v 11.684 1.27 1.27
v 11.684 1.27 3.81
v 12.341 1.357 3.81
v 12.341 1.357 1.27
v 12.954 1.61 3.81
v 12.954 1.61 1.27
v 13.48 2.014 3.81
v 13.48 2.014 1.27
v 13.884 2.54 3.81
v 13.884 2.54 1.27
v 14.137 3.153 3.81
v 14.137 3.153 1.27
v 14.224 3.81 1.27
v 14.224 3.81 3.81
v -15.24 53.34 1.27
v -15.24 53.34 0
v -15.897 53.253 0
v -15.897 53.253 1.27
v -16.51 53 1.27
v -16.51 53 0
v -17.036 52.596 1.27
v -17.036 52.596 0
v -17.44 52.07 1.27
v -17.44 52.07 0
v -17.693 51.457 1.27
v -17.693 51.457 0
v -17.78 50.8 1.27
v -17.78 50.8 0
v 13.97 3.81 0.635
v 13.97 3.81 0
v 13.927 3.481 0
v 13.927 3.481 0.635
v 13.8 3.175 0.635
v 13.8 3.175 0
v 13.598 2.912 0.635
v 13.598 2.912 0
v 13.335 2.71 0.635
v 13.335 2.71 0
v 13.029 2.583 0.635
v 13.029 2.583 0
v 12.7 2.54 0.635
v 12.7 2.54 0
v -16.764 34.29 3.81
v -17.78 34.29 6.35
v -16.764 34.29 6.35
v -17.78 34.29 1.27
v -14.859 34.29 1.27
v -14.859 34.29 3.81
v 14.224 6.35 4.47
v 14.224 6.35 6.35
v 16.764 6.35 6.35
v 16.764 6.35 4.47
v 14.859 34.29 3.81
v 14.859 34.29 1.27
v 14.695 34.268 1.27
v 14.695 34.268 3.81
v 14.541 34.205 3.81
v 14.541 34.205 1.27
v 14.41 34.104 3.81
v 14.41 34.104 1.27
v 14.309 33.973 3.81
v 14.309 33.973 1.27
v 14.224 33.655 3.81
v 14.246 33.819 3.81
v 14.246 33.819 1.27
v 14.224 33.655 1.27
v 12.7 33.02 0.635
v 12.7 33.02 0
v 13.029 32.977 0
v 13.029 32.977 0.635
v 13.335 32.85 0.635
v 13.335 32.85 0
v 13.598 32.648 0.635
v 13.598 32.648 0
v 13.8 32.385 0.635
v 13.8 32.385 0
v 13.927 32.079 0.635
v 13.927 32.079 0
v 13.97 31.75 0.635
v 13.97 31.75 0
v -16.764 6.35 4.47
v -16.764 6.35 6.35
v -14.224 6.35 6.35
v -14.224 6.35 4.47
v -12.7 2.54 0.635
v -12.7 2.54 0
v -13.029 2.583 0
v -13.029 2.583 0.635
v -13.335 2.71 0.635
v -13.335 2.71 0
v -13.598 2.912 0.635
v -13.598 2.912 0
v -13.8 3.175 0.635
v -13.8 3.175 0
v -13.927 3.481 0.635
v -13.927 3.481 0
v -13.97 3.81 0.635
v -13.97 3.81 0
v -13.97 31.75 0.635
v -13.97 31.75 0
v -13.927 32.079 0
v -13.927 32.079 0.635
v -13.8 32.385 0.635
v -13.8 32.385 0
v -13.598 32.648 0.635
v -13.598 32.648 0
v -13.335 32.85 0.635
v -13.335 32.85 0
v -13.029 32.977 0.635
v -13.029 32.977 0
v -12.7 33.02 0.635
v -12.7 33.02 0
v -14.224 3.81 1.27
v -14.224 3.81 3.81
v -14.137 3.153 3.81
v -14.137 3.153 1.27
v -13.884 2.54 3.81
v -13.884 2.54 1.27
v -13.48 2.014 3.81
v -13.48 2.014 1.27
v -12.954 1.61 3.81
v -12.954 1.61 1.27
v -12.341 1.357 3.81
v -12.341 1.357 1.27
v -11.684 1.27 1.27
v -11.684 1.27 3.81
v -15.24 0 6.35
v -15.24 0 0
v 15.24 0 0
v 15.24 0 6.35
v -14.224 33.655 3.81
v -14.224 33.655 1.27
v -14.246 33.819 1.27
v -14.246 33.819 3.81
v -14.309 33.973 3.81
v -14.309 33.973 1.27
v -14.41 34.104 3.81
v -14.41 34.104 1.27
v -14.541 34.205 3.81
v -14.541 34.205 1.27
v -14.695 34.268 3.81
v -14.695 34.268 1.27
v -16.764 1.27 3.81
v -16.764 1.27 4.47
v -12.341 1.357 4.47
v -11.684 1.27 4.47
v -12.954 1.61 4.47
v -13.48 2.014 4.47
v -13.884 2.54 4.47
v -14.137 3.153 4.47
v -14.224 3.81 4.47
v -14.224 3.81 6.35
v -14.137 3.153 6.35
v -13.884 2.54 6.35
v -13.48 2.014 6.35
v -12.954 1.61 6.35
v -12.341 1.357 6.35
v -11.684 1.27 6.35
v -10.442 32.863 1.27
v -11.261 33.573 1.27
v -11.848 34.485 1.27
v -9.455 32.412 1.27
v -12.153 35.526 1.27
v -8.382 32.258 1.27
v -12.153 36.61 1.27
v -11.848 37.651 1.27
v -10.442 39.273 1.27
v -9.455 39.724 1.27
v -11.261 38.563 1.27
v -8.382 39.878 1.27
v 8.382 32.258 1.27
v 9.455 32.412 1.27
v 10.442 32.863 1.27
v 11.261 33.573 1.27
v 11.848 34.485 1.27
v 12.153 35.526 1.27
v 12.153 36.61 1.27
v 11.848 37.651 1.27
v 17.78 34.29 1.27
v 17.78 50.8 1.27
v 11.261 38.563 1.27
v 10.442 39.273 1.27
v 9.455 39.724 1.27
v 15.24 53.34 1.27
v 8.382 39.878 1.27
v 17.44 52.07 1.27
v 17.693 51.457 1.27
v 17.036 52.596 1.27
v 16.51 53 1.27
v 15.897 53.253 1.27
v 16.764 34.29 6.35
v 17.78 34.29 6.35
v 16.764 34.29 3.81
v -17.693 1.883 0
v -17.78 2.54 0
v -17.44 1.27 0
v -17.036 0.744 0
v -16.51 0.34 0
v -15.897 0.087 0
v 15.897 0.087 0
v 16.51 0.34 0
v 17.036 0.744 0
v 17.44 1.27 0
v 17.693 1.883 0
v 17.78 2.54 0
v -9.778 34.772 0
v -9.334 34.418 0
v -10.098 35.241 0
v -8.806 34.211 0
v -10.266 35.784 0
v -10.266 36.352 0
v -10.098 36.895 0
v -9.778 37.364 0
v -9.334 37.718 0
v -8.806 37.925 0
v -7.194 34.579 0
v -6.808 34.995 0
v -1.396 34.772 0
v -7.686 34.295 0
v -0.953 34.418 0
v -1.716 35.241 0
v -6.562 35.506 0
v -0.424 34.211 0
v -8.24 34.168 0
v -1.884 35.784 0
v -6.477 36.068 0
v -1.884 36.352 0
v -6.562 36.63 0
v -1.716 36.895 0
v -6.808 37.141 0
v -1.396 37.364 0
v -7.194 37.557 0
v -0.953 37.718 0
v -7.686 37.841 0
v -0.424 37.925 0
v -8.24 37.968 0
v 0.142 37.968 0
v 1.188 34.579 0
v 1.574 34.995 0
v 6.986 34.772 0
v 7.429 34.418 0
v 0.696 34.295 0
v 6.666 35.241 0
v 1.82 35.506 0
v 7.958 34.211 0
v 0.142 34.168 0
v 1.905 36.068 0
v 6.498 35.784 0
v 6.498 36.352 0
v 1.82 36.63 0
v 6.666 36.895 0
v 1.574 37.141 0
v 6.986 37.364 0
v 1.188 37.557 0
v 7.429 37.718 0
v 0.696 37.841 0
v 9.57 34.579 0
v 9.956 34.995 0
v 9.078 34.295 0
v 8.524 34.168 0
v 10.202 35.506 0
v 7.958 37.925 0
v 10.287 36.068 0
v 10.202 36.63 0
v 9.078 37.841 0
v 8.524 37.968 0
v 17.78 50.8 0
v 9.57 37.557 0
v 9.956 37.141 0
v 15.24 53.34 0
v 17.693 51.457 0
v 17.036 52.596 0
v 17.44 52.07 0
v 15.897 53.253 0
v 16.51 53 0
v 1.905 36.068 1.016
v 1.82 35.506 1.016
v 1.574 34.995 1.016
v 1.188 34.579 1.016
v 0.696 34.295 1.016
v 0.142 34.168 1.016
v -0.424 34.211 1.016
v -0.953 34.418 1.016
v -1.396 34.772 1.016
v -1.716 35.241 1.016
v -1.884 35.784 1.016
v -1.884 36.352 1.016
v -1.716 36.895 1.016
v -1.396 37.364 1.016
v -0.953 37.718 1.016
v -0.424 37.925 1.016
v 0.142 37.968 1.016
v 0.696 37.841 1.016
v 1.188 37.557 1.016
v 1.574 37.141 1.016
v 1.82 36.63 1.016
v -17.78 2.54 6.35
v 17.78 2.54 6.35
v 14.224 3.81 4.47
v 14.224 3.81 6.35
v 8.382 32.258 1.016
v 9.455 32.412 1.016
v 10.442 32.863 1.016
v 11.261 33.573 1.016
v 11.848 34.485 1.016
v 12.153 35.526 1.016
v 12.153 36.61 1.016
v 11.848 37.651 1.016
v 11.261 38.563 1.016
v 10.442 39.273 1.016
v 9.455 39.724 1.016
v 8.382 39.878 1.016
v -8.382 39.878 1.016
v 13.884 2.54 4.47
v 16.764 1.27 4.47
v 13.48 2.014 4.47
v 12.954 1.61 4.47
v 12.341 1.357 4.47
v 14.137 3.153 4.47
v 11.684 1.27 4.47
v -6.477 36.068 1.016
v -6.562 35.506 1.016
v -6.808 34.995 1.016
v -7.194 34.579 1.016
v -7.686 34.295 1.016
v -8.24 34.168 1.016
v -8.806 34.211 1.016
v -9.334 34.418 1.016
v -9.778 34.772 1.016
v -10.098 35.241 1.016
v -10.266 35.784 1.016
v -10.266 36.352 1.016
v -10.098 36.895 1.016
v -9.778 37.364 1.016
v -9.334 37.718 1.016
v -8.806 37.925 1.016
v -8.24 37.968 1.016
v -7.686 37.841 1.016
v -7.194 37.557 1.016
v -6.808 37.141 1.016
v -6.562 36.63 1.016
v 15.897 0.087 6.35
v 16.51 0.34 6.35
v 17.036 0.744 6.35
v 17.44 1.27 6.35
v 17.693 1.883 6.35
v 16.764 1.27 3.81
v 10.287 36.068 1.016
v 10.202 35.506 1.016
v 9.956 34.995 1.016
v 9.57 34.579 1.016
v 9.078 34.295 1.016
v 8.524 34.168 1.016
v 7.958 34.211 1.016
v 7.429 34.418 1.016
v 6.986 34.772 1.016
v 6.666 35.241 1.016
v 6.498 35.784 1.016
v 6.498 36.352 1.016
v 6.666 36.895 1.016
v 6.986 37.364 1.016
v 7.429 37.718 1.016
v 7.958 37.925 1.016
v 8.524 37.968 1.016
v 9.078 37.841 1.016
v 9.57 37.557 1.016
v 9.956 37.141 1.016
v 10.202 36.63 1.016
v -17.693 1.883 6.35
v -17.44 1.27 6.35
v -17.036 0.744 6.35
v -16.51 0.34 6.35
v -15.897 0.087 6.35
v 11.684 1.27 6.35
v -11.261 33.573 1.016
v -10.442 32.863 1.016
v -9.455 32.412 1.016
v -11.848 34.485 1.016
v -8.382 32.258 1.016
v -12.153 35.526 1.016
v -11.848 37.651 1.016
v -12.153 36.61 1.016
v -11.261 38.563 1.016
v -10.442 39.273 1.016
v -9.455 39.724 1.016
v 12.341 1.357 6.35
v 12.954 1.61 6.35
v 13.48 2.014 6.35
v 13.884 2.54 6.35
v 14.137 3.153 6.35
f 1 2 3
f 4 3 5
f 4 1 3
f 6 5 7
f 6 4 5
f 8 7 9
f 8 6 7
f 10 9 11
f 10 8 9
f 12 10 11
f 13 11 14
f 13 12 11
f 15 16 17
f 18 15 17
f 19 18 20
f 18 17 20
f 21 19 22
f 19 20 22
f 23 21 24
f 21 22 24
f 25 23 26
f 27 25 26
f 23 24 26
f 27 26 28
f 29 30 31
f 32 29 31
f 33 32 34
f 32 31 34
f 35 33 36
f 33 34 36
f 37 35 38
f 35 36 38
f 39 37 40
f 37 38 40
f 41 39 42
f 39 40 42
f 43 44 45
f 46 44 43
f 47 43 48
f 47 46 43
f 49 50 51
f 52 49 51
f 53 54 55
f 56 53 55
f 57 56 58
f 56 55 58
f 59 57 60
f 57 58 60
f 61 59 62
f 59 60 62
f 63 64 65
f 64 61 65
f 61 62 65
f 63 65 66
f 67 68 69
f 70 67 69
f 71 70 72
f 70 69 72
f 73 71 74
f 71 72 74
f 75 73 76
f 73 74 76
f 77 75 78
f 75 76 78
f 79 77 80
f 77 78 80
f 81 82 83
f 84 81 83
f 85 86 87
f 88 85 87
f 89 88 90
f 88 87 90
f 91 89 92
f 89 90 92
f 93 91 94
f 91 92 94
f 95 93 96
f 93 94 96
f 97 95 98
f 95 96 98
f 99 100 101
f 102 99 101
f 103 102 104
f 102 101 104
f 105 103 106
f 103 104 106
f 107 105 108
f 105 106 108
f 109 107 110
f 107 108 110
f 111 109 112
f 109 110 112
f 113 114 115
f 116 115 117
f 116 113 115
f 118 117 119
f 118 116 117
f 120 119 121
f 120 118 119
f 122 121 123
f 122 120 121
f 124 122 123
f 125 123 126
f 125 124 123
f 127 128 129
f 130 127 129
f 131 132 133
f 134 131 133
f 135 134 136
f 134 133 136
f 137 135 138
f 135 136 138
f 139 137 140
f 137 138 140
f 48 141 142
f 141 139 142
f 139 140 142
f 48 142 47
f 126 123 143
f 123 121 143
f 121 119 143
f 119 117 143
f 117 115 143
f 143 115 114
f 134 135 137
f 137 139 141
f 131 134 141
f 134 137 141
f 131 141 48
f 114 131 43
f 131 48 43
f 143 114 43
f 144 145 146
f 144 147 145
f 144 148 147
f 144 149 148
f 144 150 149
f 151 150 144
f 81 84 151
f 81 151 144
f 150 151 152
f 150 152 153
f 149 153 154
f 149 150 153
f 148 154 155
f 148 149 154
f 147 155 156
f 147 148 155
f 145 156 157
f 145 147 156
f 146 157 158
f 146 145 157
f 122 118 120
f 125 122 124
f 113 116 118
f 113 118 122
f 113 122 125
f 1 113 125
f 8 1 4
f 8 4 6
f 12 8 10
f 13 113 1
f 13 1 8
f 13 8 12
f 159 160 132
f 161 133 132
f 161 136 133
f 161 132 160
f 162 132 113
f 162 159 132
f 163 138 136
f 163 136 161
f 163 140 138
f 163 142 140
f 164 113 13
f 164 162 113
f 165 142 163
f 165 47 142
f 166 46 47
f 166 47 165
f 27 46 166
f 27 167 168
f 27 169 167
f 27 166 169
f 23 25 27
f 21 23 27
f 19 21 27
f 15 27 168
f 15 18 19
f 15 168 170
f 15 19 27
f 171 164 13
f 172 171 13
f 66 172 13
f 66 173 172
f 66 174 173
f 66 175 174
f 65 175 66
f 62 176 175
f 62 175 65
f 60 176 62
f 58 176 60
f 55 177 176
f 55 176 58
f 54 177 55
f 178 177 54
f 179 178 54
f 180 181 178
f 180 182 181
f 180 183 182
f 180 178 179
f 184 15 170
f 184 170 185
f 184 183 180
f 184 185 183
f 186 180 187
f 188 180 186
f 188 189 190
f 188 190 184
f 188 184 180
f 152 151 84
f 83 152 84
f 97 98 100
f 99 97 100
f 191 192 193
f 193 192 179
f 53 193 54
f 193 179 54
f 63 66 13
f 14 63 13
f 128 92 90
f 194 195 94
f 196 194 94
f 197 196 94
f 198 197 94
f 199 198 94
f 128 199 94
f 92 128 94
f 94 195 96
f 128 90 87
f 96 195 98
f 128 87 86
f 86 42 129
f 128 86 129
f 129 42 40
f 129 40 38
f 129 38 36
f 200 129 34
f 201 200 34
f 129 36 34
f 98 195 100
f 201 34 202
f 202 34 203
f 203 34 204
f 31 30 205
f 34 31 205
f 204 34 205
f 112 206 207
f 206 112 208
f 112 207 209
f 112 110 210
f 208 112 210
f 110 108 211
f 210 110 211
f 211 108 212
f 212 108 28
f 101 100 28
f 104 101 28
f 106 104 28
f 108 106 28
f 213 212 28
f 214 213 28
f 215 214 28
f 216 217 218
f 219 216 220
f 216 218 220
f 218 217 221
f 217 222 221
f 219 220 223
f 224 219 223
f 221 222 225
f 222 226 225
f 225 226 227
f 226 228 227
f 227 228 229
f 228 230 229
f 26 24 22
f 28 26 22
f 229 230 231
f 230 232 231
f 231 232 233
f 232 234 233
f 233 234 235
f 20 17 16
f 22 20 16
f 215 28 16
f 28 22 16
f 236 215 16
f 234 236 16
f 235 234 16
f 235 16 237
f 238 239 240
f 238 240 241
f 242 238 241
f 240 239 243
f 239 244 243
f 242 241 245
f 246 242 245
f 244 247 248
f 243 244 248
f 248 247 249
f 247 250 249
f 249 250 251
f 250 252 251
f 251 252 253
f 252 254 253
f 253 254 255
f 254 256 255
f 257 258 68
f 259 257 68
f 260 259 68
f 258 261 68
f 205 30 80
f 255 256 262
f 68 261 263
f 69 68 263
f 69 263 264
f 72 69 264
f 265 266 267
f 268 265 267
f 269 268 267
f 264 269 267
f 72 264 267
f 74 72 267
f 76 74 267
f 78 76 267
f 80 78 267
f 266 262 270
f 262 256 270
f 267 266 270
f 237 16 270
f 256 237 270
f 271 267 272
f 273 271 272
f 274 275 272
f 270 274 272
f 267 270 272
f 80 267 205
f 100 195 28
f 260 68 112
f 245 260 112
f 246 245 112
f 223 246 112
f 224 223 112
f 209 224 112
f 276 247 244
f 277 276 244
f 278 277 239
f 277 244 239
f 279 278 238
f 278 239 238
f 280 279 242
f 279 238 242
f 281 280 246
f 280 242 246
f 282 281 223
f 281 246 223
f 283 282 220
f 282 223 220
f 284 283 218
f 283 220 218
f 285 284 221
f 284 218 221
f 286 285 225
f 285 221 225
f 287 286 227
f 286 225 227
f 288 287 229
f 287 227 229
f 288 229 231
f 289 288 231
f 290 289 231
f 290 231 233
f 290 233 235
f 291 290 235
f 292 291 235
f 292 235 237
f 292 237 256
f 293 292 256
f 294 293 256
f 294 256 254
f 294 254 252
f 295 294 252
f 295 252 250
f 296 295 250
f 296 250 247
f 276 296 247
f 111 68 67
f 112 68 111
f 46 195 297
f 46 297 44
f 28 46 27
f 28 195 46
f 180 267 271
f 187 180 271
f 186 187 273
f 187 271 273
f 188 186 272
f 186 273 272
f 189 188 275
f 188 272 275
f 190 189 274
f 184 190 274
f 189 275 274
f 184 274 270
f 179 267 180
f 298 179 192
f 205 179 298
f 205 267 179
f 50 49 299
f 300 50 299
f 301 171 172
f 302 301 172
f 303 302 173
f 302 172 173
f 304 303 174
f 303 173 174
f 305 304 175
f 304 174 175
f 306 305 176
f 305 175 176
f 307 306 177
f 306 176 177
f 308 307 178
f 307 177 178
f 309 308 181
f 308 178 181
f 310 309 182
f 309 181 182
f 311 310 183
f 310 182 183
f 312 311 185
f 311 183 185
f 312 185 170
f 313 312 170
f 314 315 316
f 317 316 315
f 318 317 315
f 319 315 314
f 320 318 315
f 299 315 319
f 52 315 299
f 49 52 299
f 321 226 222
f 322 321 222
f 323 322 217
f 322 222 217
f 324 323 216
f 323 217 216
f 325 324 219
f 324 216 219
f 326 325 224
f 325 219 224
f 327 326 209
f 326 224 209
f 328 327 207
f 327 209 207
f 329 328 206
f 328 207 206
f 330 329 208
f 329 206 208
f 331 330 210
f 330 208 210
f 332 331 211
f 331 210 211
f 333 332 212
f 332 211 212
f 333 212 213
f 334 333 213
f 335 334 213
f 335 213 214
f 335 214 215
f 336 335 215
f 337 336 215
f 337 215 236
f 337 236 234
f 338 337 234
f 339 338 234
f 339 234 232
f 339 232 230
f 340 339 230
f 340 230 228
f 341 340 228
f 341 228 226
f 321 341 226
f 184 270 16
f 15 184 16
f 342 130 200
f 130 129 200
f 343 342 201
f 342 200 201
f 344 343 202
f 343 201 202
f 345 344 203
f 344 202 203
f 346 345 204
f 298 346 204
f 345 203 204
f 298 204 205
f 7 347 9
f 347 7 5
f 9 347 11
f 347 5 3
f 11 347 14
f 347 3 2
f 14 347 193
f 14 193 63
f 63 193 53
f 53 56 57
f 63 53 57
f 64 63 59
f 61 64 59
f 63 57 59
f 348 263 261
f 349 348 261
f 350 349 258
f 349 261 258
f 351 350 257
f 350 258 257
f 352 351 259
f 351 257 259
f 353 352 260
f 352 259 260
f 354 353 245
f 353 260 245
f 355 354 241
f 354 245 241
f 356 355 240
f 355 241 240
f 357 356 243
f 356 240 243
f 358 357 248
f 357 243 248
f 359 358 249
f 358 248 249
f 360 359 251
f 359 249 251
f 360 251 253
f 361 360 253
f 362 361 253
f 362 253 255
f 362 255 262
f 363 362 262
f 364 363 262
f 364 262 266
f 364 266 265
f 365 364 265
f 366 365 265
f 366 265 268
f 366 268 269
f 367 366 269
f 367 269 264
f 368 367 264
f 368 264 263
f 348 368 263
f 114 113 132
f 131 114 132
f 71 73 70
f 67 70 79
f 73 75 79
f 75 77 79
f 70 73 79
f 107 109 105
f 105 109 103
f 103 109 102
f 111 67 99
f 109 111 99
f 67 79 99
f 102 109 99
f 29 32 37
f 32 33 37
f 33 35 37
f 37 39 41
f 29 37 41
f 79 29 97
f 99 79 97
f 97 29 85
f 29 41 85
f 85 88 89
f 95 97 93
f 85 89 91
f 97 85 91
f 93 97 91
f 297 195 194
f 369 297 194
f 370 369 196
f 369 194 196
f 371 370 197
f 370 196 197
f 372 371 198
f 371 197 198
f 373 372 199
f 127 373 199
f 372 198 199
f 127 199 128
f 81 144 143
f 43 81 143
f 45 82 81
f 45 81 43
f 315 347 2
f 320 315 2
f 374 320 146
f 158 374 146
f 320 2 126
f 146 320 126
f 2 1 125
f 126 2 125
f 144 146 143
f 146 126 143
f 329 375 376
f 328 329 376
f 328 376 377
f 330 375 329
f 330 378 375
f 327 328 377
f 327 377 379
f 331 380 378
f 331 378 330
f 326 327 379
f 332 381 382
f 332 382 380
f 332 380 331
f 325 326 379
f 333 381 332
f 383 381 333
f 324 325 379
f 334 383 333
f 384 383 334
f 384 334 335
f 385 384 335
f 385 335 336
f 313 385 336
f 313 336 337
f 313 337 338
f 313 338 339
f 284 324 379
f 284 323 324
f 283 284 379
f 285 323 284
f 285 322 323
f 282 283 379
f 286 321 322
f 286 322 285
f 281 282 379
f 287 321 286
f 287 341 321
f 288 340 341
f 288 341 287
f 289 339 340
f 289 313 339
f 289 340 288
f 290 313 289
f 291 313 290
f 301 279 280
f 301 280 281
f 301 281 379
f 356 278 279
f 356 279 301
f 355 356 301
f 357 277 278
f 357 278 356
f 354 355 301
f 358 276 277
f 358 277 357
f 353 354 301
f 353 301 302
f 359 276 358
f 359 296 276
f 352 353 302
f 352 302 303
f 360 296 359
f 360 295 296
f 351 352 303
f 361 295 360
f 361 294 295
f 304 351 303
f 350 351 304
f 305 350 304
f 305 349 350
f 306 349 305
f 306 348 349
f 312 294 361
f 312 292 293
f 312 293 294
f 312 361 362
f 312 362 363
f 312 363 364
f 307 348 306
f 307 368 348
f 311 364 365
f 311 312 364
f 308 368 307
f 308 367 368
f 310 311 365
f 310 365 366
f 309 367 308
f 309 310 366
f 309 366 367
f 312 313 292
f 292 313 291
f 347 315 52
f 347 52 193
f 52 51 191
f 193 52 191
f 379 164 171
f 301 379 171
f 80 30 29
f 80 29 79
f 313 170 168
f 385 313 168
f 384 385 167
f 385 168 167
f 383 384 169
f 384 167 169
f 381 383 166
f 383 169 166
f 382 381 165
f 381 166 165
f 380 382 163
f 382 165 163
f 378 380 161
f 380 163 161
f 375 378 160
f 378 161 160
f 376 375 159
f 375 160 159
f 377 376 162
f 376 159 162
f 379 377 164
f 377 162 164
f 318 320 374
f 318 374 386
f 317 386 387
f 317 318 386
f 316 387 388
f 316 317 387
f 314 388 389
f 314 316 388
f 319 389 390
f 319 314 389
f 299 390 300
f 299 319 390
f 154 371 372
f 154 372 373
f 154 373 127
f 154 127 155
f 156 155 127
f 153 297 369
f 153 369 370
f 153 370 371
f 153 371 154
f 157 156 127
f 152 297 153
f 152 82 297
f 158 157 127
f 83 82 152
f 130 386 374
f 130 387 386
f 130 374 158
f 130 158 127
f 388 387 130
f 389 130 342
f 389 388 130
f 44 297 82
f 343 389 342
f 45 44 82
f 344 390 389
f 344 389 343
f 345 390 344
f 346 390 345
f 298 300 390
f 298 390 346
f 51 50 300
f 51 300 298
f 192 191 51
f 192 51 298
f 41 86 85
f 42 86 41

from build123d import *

# Parameters (mm, degrees)
PAD_DEPTH       = 1.27
POCKET_DEPTH    = 0.635
SKETCH002_R     = 1.905
POCKET001_DEPTH = 5.08
PAD001_DEPTH    = 5.08
SKETCH005_W     = 33.528
SKETCH005_H     = 0.6604
POCKET002_DEPTH = 33.02
SKETCH006_W     = 33.528
SKETCH006_H     = 27.94
POCKET003_DEPTH = 2.54
POCKET004_DEPTH = 0.254


with BuildPart() as part:
    # Sketch → Pad (new body)
    with BuildSketch(Plane.XY):
        with BuildLine():
            Line((-15.24, 0), (15.24, 0))
            ThreePointArc((15.24, 0), (17.036051, 0.743949), (17.78, 2.54))
            Line((17.78, 2.54), (17.78, 50.8))
            ThreePointArc((17.78, 50.8), (17.036051, 52.596051), (15.24, 53.34))
            Line((15.24, 53.34), (-15.24, 53.34))
            ThreePointArc((-15.24, 53.34), (-17.036051, 52.596051), (-17.78, 50.8))
            Line((-17.78, 2.54), (-17.78, 50.8))
            ThreePointArc((-17.78, 2.54), (-17.036051, 0.743949), (-15.24, 0))
        make_face()
    extrude(amount=PAD_DEPTH)

    # Sketch001 (on Face9 of Pad) → Pocket (cut)
    with BuildSketch(Plane(origin=(0, 0, 0), x_dir=(1, 0, 0), z_dir=(0, 0, -1))):
        with BuildLine():
            Line((-12.7, -2.54), (12.7, -2.54))
            ThreePointArc((13.97, -3.81), (13.598026, -2.911974), (12.7, -2.54))
            Line((13.97, -3.81), (13.97, -31.75))
            ThreePointArc((12.7, -33.02), (13.598026, -32.648026), (13.97, -31.75))
            Line((12.7, -33.02), (-12.7, -33.02))
            ThreePointArc((-13.97, -31.75), (-13.598026, -32.648026), (-12.7, -33.02))
            Line((-13.97, -3.81), (-13.97, -31.75))
            ThreePointArc((-12.7, -2.54), (-13.598026, -2.911974), (-13.97, -3.81))
        make_face()
    extrude(amount=-POCKET_DEPTH, mode=Mode.SUBTRACT)

    # Sketch002 (on Face4 of Pocket) → Pocket001 (cut)
    with BuildSketch(Plane(origin=(0, 0, 0), x_dir=(1, 0, 0), z_dir=(0, 0, -1))):
        with Locations((0, -36.068)):
            Circle(SKETCH002_R)
        with Locations((8.382, -36.068)):
            Circle(SKETCH002_R)
        with Locations((-8.382, -36.068)):
            Circle(SKETCH002_R)
    extrude(amount=-POCKET001_DEPTH, mode=Mode.SUBTRACT)

    # Sketch004 (on Face5 of Pocket001) → Pad001 (join)
    with BuildSketch(Plane.XY.offset(1.27)):
        with BuildLine():
            Line((-15.24, 0), (15.24, 0))
            ThreePointArc((15.24, 0), (17.036051, 0.743949), (17.78, 2.54))
            Line((17.78, 34.29), (17.78, 2.54))
            Line((17.78, 34.29), (14.859, 34.29))
            ThreePointArc((14.859, 34.29), (14.409987, 34.104013), (14.224, 33.655))
            Line((14.224, 33.655), (14.224, 3.81))
            ThreePointArc((11.684, 1.27), (13.480051, 2.013949), (14.224, 3.81))
            Line((11.684, 1.27), (-11.684, 1.27))
            ThreePointArc((-14.224, 3.81), (-13.480051, 2.013949), (-11.684, 1.27))
            Line((-14.224, 3.81), (-14.224, 33.655))
            ThreePointArc((-14.224, 33.655), (-14.409987, 34.104013), (-14.859, 34.29))
            Line((-17.78, 34.29), (-14.859, 34.29))
            Line((-17.78, 2.54), (-17.78, 34.29))
            ThreePointArc((-17.78, 2.54), (-17.036051, 0.743949), (-15.24, 0))
        make_face()
    extrude(amount=PAD001_DEPTH)

    # Sketch005 (on Face27 of Pad001) → Pocket002 (cut)
    with BuildSketch(Plane(origin=(0, 34.29, 0), x_dir=(-1, 0, 0), z_dir=(0, 1, 0))):
        with Locations((0, 4.1402)):
            Rectangle(SKETCH005_W, SKETCH005_H)
    extrude(amount=-POCKET002_DEPTH, mode=Mode.SUBTRACT)

    # Sketch006 (on Face25 of Pocket002) → Pocket003 (cut)
    with BuildSketch(Plane.XY.offset(6.35)):
        with Locations((0, 20.32)):
            Rectangle(SKETCH006_W, SKETCH006_H)
    extrude(amount=-POCKET003_DEPTH, mode=Mode.SUBTRACT)

    # Sketch007 (on Face8 of Pocket003) → Pocket004 (cut)
    with BuildSketch(Plane.XY.offset(1.27)):
        with BuildLine():
            ThreePointArc((-8.382, 39.878), (-12.192, 36.068), (-8.382, 32.258))
            Line((-8.382, 32.258), (8.382, 32.258))
            ThreePointArc((8.382, 32.258), (12.192, 36.068), (8.382, 39.878))
            Line((8.382, 39.878), (-8.382, 39.878))
        make_face()
    extrude(amount=-POCKET004_DEPTH, mode=Mode.SUBTRACT)


solid = part.part
